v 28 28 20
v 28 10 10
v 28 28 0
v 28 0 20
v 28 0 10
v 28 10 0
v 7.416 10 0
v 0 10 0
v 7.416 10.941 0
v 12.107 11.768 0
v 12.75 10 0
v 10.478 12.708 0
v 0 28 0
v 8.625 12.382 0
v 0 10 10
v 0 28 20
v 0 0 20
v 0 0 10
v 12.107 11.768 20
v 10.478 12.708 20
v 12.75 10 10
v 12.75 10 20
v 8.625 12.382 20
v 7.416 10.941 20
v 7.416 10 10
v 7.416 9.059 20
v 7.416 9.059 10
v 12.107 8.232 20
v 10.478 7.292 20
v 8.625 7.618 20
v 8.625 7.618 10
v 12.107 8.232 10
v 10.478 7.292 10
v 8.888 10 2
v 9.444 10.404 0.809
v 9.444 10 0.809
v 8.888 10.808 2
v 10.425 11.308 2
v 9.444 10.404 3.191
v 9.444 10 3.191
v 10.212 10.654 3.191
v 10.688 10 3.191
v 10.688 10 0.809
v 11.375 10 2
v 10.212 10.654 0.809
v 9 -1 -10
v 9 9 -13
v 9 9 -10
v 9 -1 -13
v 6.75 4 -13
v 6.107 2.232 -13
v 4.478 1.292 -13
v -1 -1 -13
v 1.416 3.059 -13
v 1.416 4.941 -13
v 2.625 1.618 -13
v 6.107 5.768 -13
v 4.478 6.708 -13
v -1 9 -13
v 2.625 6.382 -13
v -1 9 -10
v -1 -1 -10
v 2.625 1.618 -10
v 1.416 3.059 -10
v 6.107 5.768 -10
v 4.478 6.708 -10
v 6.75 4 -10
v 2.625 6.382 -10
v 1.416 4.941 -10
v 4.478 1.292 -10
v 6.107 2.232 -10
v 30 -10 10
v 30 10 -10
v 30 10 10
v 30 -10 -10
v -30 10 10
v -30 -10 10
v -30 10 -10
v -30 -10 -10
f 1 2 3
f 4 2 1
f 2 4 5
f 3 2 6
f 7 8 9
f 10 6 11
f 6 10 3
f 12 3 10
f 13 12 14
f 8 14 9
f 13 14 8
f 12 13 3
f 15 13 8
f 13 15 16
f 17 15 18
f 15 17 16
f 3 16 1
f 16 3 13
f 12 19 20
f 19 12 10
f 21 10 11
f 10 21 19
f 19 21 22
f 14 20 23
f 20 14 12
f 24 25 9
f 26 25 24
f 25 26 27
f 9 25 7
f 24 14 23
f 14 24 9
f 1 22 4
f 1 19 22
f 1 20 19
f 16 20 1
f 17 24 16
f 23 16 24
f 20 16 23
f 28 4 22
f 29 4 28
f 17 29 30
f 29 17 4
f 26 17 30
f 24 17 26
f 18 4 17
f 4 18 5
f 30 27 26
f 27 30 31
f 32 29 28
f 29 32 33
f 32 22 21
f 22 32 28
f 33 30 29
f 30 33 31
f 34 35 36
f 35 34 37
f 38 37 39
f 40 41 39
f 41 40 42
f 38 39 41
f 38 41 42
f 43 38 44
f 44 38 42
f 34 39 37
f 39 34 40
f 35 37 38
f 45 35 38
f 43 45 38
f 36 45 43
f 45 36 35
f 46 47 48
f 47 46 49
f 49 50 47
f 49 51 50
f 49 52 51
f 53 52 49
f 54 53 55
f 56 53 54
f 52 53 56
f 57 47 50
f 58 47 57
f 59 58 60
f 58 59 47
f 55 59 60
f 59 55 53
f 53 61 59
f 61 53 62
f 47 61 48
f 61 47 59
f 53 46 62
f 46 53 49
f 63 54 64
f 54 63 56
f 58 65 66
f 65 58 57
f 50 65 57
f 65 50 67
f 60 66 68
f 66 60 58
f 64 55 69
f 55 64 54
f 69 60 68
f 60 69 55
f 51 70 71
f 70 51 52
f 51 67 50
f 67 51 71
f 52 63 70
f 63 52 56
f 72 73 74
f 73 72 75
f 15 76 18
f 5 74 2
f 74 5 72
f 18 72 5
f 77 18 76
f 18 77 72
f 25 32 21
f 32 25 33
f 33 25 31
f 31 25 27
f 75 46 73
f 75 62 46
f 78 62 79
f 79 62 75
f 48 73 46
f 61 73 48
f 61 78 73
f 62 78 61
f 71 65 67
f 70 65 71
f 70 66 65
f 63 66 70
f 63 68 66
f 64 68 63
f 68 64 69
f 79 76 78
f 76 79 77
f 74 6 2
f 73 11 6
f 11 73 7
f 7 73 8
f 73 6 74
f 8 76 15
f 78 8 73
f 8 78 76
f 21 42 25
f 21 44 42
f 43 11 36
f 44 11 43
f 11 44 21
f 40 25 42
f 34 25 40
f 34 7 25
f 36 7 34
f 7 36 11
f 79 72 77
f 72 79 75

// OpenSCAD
// Parameters
leg_length_x = 28; //[14:56:1]
leg_length_y = 28; //[14:56:1]
extrusion_size = 20; //[10:40:1]
base_thickness = 4; //[2:8:1]
side_thickness = 4; //[2:10:1]
hole_count = 2; //[2:2:1]
hole_diameter = 5.5; //[3:11:0.1]
hole_offset_from_inner_corner = 10; //[5:20:1]
inner_corner_radius = 2; //[0:6:0.5]
overlap = 1; //[0.5:2:0.1]
extrusion_length = 60; //[30:120:1]
extrusion_gap = 0.2; //[0:1:0.1]
gusset_length = 18; //[10:36:1]
gusset_height = 16; //[8:28:1]

// Extrusion - complete detailed geometry
module extrusion() {
  color([0.0, 0.4, 0.2])
    cube([extrusion_length, extrusion_size, extrusion_size], center=true);
}

// Extrusion Inner Corner Bracket - complete detailed geometry
module extrusion_inner_corner_bracket() {
  color("Silver") {
    difference() {
      cube([extrusion_size/2, extrusion_size/2, base_thickness], center=false);
      translate([extrusion_size/4, extrusion_size/4, 0])
        cylinder(d=hole_diameter, h=base_thickness + 2*overlap, center=false);
    }
  }
}

// Extrusion Corner Bracket - complete detailed geometry
module extrusion_corner_bracket() {
  color("Silver") {
    difference() {
      cube([leg_length_x, leg_length_y, base_thickness], center=false);
      translate([hole_offset_from_inner_corner, extrusion_size/2, 0])
        cylinder(d=hole_diameter, h=base_thickness + 2*overlap, center=false);
      translate([extrusion_size/2, hole_offset_from_inner_corner, 0])
        cylinder(d=hole_diameter, h=base_thickness + 2*overlap, center=false);
    }
  }
}

// Extrusion Corner Bracket 3D - complete detailed geometry
module extrusion_corner_bracket_3D() {
  color("Silver") {
    difference() {
      cube([leg_length_x, leg_length_y, base_thickness + gusset_height], center=false);
      translate([hole_offset_from_inner_corner, extrusion_size/2, 0])
        cylinder(d=hole_diameter, h=base_thickness + gusset_height + 2*overlap, center=false);
      translate([extrusion_size/2, hole_offset_from_inner_corner, 0])
        cylinder(d=hole_diameter, h=base_thickness + gusset_height + 2*overlap, center=false);
    }
  }
}

// Extrusion Corner Bracket Hole Positions - complete detailed geometry
module extrusion_corner_bracket_hole_positions() {
  color("Silver") {
    translate([hole_offset_from_inner_corner, extrusion_size/2, base_thickness/2])
      sphere(r=hole_diameter/4, center=true);
    translate([extrusion_size/2, hole_offset_from_inner_corner, base_thickness/2])
      sphere(r=hole_diameter/4, center=true);
  }
}

// Assembly (fixed connectivity)
// - Everything is in a single union()
// - Inner-corner tab is re-positioned to physically intersect the main bracket AND the extrusion
// - Uses 1mm overlap to guarantee connection (no gaps / no floating)
module assembly() {
  union() {
    // Main extrusion (centered)
    extrusion();

    // Main bracket parts (kept at origin as in original)
    translate([0, 0, 0]) extrusion_corner_bracket();
    translate([0, 0, 0]) extrusion_corner_bracket_3D();
    translate([0, 0, 0]) extrusion_corner_bracket_hole_positions();

    // Inner-corner bracket/tab (FIXED):
    // Attach to the underside of the extrusion (Z) and also overlap into the main bracket footprint (X/Y).
    // Extrusion spans:
    //   X: [-extrusion_length/2, +extrusion_length/2]
    //   Y: [-extrusion_size/2,  +extrusion_size/2]
    //   Z: [-extrusion_size/2,  +extrusion_size/2]
    //
    // Place tab so its TOP is inside extrusion by 'overlap':
    //   tab_z = (-extrusion_size/2) - base_thickness + overlap
    //
    // Place tab so it intersects the main bracket at origin by 'overlap' in X and Y:
    //   tab_x = -overlap  (so it extends from -overlap .. (extrusion_size/2 - overlap))
    //   tab_y = -overlap  (so it extends from -overlap .. (extrusion_size/2 - overlap))
    translate([
      -overlap,
      -overlap,
      -extrusion_size/2 - base_thickness + overlap
    ])
      extrusion_inner_corner_bracket();
  }
}

assembly();
